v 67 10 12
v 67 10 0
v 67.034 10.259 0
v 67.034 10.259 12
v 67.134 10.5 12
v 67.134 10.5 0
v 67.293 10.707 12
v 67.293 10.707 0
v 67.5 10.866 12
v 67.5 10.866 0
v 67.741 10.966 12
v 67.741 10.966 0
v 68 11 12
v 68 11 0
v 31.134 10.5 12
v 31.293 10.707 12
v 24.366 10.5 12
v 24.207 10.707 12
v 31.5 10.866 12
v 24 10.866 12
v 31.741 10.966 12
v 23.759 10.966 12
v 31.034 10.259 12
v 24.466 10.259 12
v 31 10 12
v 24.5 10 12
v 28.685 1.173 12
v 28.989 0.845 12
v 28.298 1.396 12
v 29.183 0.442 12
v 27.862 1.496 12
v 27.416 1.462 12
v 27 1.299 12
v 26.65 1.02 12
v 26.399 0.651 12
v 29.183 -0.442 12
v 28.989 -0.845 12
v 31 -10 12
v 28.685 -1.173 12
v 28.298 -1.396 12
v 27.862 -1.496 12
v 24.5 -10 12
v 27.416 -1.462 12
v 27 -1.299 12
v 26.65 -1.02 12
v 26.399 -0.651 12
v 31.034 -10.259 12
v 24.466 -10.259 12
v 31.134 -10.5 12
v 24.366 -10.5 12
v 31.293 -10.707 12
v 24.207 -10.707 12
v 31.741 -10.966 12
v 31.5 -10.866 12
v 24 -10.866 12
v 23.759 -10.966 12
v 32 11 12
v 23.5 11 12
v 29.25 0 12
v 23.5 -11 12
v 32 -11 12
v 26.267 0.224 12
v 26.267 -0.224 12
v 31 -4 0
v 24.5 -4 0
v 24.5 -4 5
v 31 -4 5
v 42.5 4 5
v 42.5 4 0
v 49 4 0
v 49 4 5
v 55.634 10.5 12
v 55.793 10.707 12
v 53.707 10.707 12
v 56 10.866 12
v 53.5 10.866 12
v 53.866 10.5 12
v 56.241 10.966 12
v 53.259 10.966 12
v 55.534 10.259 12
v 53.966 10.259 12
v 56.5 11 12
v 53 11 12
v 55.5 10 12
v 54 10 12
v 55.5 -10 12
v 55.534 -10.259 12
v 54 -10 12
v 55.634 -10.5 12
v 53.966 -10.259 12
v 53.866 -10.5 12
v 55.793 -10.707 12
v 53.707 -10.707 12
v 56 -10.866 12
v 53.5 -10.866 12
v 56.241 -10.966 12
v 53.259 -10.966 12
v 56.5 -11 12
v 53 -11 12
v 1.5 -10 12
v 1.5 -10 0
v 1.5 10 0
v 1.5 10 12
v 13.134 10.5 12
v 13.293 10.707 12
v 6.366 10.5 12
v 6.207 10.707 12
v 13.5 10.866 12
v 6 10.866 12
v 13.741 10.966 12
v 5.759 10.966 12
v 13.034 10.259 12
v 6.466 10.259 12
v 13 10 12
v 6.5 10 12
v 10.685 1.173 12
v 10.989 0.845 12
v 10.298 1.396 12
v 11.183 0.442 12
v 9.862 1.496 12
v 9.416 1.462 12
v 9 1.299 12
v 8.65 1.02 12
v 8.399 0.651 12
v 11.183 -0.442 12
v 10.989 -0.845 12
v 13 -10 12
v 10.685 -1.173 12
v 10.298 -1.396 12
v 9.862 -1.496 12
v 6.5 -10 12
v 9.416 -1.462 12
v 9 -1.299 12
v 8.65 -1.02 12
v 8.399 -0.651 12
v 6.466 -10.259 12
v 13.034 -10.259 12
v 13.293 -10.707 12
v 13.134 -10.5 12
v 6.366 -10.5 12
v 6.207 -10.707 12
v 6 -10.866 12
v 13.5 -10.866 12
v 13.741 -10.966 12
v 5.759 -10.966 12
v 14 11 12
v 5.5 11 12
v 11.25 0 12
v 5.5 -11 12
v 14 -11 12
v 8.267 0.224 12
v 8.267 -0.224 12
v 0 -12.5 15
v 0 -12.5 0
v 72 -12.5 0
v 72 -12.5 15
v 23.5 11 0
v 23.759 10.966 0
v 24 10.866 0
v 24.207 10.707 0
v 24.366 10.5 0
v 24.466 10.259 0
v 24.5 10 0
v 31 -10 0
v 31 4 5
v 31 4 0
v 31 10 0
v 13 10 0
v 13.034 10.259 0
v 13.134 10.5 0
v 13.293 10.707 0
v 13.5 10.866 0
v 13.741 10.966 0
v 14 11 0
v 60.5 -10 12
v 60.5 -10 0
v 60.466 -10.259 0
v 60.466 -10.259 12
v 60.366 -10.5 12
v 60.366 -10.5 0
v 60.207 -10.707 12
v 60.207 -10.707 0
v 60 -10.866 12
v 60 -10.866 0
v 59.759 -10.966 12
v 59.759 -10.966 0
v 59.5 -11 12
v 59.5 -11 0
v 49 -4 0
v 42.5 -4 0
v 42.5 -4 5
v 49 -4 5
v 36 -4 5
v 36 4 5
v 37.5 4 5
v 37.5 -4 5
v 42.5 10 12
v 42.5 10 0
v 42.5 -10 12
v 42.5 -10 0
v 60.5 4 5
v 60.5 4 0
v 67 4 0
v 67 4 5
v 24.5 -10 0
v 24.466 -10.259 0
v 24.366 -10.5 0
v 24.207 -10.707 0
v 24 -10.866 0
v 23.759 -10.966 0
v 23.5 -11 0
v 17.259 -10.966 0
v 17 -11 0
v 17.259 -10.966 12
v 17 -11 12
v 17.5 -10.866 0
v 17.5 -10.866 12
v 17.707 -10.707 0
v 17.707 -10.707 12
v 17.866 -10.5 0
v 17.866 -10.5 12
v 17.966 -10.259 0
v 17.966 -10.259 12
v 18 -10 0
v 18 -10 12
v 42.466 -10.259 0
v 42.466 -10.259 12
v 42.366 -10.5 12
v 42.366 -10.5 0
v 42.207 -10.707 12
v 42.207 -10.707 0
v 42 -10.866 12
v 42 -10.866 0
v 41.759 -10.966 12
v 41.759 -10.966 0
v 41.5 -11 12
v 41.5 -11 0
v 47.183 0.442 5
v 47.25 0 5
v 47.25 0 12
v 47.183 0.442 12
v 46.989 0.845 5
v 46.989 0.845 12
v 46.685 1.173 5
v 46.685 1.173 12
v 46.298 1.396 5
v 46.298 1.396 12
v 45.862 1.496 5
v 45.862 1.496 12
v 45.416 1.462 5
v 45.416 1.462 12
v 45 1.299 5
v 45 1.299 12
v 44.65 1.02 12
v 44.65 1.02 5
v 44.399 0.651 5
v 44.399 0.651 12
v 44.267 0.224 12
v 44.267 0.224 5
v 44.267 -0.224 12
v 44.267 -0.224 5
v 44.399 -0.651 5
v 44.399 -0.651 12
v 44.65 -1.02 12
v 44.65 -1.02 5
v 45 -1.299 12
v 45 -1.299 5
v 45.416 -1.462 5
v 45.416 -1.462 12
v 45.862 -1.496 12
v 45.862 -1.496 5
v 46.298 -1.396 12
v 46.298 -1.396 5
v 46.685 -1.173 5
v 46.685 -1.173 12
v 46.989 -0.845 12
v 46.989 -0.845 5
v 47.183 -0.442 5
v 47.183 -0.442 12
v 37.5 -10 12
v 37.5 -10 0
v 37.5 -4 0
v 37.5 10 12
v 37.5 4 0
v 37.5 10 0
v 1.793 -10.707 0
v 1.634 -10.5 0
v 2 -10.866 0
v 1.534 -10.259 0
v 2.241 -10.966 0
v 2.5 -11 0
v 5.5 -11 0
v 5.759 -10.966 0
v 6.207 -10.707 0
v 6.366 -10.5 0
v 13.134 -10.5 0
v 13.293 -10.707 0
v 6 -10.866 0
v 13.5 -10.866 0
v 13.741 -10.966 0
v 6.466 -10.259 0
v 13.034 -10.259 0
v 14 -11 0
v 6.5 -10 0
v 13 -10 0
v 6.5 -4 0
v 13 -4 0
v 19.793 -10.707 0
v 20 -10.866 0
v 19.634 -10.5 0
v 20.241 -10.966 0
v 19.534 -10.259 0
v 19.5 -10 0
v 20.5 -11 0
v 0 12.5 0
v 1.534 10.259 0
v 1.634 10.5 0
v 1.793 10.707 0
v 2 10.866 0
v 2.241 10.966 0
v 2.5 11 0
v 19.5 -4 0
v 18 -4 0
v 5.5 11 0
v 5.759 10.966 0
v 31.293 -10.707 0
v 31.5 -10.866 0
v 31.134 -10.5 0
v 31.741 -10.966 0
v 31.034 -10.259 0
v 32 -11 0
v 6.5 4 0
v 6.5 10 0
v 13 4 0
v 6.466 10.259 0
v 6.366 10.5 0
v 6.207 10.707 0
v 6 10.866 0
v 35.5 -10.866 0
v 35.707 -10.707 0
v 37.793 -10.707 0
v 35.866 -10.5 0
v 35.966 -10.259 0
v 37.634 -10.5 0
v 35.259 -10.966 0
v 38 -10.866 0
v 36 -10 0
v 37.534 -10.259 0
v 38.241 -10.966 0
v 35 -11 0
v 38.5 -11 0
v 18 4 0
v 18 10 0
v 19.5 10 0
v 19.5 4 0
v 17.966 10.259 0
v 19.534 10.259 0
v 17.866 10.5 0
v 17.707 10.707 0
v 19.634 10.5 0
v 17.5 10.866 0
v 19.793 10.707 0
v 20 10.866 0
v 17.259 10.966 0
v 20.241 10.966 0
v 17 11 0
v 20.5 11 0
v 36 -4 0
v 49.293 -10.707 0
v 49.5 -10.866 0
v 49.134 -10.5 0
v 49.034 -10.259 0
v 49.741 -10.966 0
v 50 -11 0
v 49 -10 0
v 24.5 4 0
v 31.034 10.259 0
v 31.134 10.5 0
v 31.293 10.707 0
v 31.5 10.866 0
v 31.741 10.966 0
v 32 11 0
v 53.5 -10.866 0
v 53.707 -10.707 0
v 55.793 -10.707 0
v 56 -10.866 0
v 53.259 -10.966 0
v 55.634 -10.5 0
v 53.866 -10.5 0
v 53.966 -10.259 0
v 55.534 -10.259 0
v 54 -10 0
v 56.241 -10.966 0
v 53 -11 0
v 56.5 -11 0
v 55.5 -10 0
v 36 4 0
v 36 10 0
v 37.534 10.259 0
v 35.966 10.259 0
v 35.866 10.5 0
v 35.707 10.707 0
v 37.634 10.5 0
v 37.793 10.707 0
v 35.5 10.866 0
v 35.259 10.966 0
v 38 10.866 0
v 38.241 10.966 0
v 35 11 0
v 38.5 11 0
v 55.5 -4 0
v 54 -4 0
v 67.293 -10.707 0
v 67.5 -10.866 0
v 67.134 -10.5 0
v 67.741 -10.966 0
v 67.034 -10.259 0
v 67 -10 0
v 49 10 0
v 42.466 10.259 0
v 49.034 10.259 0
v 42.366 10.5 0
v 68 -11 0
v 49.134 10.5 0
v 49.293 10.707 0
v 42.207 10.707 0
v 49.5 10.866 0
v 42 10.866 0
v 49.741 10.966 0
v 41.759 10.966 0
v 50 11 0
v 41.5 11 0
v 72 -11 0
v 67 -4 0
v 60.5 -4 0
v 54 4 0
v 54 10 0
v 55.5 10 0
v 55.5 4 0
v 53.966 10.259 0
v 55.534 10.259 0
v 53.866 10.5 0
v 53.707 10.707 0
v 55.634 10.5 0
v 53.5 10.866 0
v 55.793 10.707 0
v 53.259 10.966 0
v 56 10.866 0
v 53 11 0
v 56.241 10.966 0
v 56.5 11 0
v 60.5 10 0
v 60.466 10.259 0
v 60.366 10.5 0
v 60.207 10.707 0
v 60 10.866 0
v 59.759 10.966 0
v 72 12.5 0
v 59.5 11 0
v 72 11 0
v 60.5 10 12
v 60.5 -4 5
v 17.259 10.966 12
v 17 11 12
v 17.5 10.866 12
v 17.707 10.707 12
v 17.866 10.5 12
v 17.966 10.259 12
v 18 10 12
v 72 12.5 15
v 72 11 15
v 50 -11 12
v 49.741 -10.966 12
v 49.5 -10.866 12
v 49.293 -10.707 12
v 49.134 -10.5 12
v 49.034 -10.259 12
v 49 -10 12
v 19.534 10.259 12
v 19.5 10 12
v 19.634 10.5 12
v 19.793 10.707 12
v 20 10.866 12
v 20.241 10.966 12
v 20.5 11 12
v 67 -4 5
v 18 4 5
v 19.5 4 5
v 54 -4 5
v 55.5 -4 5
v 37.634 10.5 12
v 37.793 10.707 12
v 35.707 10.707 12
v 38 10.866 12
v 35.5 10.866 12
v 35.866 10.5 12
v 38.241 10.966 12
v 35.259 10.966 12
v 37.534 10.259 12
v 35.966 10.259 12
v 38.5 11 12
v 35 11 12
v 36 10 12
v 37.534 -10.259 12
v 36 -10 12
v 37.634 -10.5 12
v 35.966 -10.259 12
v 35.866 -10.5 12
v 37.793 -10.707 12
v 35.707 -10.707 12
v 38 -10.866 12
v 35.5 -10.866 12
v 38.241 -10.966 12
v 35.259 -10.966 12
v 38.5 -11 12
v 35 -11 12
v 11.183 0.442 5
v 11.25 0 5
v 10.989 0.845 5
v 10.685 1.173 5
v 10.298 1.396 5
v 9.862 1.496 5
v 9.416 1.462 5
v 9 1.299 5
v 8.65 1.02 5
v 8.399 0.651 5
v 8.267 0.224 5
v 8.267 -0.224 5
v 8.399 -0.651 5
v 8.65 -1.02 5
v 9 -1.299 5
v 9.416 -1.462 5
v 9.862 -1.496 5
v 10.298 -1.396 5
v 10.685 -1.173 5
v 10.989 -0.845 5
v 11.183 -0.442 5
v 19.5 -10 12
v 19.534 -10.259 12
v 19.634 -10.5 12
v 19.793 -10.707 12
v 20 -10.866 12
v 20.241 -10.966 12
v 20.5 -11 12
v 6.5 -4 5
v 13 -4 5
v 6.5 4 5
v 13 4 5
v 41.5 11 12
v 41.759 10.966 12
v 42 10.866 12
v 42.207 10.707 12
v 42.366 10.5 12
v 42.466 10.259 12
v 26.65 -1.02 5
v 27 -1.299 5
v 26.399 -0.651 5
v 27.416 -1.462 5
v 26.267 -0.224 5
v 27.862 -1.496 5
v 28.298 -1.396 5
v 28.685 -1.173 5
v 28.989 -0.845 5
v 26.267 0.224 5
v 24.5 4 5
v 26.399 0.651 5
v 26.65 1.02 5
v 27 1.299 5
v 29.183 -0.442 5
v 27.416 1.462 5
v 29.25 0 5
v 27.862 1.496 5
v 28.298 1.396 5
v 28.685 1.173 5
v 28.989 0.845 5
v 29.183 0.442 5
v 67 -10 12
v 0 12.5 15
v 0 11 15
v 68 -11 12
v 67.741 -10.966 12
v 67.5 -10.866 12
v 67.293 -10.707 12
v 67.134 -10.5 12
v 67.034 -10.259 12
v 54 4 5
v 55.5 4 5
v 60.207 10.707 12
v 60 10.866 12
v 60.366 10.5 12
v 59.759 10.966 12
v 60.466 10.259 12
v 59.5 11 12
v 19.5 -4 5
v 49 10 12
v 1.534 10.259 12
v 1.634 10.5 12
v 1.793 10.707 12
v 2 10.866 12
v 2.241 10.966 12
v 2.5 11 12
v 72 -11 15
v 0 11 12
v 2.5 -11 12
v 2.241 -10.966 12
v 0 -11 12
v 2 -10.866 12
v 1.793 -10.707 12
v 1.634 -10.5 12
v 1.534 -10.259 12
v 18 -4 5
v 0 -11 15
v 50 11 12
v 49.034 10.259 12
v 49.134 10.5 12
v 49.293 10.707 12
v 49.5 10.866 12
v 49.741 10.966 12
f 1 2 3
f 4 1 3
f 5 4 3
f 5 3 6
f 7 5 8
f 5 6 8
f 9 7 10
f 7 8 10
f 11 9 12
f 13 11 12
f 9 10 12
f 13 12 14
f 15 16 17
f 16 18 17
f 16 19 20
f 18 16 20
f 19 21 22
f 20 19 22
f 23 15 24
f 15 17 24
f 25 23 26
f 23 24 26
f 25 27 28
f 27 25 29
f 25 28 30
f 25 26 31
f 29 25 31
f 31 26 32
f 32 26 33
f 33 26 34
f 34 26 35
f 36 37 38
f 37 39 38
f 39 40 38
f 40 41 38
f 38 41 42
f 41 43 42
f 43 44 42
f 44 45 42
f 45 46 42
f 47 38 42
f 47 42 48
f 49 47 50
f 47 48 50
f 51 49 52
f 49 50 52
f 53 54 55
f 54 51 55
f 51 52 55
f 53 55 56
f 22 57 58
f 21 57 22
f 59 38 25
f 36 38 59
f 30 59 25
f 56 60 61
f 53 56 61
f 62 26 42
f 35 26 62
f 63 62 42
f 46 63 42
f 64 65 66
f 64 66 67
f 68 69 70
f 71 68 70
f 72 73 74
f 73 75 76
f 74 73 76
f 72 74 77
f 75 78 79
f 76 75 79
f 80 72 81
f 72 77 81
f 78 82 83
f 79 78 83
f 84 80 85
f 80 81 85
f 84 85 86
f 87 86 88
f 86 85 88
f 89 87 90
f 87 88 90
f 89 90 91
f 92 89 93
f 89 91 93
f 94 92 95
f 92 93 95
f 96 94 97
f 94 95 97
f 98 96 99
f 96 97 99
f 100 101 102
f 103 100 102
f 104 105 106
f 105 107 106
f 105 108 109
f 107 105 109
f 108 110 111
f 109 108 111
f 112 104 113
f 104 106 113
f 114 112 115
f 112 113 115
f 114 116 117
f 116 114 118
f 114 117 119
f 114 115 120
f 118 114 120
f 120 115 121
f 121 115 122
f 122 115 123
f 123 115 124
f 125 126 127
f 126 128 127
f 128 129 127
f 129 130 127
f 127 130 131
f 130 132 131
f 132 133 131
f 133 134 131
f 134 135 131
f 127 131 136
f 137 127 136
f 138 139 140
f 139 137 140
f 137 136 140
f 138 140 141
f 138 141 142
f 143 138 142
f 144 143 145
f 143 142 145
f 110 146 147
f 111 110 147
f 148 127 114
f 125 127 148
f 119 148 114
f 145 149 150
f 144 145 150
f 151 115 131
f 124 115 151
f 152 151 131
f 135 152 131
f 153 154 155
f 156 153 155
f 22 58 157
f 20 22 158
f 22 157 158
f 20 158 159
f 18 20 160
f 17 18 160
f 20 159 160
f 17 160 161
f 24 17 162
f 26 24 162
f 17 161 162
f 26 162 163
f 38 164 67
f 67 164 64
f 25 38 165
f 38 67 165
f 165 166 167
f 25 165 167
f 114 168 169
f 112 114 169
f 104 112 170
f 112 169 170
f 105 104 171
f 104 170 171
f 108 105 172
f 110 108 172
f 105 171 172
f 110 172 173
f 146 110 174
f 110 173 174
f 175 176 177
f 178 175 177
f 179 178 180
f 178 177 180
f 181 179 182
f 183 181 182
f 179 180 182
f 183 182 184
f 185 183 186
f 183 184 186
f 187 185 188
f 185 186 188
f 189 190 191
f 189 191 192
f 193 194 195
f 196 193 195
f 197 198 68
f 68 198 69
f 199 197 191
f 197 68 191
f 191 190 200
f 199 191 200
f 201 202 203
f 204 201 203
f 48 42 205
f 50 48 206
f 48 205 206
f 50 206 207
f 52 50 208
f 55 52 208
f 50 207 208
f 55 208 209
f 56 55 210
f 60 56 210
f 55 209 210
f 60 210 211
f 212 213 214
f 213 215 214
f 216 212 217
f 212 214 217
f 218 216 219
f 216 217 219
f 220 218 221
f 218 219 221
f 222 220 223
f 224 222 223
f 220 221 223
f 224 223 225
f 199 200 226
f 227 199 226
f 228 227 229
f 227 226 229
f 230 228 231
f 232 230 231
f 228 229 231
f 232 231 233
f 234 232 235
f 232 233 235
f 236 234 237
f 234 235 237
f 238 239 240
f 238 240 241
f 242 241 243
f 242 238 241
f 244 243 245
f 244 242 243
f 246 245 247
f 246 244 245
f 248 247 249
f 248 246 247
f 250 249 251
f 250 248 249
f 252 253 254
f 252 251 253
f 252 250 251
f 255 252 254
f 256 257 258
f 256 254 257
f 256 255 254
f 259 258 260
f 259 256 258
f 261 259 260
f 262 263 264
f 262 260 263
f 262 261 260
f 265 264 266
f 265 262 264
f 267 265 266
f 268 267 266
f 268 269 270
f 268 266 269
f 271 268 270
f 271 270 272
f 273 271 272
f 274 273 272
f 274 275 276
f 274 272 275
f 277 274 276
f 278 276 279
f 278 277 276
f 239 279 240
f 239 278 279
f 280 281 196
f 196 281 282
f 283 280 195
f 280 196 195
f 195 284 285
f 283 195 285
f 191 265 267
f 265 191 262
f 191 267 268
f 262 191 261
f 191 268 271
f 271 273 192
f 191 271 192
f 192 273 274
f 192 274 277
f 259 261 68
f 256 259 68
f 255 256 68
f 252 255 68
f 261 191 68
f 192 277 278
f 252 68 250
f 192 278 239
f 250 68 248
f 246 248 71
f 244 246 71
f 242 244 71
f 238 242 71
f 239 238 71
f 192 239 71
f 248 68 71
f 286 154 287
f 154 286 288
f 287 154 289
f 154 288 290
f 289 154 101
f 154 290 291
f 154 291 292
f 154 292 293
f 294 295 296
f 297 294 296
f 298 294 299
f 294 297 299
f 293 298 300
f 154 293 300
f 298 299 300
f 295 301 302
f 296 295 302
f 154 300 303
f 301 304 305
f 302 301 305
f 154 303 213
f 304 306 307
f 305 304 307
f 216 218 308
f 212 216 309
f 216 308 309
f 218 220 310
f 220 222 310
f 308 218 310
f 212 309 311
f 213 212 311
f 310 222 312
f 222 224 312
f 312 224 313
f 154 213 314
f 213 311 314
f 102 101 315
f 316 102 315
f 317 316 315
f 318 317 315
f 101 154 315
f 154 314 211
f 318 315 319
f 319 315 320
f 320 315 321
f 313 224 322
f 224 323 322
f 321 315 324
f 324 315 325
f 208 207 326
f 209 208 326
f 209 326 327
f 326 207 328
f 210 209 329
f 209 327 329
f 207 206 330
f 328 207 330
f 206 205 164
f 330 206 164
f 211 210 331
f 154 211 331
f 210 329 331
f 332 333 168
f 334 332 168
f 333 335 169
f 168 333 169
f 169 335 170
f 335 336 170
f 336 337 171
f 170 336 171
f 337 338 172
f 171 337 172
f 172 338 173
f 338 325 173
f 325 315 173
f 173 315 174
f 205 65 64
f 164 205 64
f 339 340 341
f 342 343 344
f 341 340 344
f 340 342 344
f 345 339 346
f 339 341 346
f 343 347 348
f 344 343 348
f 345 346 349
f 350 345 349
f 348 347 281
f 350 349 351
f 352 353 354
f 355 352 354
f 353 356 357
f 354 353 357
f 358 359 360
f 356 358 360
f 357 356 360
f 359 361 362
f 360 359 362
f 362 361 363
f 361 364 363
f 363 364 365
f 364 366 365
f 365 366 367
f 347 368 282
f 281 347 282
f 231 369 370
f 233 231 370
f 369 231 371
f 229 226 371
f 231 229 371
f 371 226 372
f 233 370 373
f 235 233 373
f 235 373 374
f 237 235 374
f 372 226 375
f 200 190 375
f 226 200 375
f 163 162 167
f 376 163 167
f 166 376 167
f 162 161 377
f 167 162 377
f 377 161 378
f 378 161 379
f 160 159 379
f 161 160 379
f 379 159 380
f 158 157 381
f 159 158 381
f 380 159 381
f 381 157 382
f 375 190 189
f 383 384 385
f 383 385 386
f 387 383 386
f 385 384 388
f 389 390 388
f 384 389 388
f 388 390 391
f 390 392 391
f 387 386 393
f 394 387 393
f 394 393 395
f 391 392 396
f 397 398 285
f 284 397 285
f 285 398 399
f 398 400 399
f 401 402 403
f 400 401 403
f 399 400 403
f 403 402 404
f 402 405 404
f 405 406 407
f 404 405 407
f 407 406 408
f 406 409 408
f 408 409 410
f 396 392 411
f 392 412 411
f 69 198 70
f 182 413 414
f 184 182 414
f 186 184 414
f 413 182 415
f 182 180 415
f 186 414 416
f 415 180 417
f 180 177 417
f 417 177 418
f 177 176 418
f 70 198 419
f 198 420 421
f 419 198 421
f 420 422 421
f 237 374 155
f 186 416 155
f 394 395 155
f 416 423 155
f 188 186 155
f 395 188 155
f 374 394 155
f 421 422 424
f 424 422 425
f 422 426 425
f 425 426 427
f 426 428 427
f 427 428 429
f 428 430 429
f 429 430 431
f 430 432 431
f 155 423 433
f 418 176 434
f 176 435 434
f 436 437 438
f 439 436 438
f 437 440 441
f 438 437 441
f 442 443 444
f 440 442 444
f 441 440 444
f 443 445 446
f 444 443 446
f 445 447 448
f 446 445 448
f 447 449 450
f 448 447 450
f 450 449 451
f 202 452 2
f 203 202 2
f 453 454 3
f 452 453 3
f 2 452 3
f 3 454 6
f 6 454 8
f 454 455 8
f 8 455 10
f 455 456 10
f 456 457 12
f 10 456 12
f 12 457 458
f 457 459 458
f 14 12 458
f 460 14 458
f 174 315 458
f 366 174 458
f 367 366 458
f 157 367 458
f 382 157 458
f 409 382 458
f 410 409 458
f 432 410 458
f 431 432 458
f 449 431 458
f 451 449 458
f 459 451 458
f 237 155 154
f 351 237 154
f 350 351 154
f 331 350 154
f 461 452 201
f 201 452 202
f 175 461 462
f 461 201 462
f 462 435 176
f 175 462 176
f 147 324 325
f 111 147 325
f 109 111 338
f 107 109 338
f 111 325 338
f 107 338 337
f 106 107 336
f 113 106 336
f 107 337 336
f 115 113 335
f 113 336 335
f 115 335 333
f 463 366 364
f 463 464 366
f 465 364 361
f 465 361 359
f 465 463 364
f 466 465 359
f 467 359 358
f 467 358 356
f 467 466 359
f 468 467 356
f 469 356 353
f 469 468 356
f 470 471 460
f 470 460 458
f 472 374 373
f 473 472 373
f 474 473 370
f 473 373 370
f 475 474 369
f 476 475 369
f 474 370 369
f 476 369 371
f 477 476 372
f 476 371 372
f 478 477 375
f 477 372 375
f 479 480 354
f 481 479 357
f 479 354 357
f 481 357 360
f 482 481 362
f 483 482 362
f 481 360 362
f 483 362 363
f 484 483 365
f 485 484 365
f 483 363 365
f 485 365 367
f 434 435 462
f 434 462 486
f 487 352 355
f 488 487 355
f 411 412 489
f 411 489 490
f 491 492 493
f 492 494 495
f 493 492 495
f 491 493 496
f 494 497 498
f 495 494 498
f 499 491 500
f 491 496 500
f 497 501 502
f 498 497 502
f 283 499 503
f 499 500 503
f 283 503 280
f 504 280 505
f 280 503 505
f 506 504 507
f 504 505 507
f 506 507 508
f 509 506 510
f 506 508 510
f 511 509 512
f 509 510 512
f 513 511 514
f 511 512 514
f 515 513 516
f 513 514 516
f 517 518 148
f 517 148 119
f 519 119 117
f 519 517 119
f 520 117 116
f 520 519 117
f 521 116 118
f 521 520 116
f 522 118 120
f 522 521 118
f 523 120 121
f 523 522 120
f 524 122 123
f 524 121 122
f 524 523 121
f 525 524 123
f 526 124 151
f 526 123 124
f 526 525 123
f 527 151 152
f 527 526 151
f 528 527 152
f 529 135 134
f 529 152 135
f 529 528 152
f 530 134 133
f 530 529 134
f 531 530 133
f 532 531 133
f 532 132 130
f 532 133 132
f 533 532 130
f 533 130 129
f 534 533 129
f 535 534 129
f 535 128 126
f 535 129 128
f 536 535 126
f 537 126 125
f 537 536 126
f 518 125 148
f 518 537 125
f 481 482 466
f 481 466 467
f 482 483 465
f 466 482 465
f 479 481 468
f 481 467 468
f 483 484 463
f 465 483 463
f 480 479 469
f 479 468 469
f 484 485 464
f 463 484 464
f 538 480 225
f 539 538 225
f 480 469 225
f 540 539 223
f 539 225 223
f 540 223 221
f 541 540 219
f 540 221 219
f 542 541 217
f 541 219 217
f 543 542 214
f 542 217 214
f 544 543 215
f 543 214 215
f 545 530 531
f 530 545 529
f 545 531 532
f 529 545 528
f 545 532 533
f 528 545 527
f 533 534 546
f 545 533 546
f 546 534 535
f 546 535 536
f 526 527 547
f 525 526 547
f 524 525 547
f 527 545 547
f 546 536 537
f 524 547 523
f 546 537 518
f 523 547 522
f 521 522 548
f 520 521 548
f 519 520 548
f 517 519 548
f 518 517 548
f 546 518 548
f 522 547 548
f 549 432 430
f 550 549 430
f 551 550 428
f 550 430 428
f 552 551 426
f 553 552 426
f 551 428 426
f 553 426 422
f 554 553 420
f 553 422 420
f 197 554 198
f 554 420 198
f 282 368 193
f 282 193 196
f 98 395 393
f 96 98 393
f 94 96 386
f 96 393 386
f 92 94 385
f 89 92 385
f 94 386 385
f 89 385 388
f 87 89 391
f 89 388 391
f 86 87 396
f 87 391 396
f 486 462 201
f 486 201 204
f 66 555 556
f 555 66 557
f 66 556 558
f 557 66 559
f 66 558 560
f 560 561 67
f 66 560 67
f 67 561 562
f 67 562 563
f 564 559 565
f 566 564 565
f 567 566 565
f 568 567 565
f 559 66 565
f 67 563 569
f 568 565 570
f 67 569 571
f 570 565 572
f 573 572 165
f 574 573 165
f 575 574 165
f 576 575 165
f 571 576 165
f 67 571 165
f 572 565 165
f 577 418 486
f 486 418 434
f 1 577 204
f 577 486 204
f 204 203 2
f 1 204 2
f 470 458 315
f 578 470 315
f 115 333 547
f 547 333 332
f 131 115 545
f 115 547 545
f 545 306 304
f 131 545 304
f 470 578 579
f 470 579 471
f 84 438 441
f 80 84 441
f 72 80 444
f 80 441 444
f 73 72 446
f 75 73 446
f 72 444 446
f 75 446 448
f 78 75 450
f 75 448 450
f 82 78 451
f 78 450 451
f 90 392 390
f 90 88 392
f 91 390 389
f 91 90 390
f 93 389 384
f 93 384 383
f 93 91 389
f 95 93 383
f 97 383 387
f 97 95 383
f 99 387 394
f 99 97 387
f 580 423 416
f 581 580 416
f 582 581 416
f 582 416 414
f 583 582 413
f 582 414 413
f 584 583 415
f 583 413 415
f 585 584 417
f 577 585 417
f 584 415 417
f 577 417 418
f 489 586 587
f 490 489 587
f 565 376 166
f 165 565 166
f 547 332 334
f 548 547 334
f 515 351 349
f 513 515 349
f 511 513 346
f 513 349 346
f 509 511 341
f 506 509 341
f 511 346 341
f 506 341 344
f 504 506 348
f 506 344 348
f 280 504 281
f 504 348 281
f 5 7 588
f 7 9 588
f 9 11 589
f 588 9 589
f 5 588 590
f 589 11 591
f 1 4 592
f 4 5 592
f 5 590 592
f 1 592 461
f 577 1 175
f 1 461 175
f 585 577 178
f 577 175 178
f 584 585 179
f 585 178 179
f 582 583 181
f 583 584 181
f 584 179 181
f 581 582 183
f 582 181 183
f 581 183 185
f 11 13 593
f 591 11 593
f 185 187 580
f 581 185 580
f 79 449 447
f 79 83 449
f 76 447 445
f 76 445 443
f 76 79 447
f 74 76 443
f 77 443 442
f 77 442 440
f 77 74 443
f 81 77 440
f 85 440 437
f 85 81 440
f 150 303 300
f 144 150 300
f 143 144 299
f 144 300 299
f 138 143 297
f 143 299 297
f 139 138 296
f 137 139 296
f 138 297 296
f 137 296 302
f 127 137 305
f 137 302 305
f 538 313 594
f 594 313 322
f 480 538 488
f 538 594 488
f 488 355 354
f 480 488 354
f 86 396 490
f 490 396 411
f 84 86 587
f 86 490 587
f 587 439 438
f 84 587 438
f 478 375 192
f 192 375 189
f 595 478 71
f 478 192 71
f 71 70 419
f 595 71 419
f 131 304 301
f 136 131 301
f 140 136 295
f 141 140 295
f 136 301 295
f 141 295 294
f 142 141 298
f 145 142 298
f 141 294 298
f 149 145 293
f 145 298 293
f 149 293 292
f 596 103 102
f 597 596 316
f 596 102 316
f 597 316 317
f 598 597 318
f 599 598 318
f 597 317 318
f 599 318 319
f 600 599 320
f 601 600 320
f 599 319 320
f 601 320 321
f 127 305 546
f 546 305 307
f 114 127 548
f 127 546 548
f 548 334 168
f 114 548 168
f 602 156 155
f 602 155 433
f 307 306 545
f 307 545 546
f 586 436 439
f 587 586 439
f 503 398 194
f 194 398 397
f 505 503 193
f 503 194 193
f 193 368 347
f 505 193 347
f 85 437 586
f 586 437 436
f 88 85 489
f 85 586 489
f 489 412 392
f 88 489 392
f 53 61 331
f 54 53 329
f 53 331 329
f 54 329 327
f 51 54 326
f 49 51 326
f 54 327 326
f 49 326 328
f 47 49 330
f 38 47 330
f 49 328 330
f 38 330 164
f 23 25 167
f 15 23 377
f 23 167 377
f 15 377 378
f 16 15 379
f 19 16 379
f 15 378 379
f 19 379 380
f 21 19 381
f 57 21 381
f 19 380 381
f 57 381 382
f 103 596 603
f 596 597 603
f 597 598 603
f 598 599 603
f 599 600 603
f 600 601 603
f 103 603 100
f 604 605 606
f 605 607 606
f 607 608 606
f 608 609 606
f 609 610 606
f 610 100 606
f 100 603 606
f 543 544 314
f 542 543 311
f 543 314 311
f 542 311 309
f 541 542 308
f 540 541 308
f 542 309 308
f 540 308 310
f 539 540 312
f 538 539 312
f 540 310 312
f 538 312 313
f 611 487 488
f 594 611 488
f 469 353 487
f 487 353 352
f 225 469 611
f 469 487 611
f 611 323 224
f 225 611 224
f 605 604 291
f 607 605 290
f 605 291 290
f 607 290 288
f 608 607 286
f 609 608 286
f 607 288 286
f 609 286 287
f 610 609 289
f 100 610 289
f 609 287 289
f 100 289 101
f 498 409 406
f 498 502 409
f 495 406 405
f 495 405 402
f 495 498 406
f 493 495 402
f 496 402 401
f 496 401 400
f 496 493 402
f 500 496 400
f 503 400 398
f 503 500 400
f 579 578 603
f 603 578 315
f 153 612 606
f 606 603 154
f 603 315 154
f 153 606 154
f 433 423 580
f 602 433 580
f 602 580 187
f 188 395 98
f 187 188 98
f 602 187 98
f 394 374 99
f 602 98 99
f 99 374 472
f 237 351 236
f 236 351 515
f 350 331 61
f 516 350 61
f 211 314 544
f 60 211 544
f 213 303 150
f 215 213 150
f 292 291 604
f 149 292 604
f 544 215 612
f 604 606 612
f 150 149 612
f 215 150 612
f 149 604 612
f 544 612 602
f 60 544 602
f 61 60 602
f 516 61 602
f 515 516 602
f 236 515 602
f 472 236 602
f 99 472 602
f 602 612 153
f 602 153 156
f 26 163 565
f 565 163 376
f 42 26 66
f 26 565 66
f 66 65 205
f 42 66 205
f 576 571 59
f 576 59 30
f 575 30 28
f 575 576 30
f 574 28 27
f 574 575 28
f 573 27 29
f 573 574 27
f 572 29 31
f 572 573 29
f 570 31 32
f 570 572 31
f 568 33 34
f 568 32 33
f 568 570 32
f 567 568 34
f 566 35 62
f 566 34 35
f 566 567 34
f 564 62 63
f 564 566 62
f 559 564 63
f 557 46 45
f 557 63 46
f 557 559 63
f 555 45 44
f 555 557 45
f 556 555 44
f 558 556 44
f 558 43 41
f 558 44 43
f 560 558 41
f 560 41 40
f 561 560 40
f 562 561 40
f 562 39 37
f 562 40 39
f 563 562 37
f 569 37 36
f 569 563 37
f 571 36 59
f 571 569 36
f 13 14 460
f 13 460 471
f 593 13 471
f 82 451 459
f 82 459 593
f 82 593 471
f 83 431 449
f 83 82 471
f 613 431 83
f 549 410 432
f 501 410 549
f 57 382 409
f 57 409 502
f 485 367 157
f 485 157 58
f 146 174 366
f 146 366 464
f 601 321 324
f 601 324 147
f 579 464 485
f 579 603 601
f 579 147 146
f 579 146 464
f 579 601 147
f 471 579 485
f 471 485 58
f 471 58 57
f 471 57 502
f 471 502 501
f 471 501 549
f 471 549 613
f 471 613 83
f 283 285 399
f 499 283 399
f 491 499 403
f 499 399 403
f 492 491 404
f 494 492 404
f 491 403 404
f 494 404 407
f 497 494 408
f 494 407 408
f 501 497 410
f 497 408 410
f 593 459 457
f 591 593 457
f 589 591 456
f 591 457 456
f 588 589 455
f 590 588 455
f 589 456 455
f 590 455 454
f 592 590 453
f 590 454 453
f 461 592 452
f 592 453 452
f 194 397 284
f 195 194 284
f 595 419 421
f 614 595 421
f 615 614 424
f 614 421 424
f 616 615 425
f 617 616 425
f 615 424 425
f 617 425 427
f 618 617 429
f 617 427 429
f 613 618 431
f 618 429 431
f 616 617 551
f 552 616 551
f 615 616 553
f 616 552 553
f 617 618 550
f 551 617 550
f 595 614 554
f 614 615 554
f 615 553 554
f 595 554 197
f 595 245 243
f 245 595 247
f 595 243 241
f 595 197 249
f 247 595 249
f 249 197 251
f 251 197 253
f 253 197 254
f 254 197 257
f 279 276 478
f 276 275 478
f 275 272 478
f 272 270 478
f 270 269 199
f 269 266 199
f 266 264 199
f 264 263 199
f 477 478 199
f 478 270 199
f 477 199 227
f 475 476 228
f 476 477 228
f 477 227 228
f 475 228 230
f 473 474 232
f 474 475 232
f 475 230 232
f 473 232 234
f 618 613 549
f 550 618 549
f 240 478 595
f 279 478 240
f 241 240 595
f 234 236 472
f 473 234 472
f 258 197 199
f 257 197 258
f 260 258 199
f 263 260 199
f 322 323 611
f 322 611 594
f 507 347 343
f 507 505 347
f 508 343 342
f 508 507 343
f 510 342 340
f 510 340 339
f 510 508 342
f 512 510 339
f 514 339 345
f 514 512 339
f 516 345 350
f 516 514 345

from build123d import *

# Parameters (mm, degrees)
F0_R     = 1.5
F1_DEPTH = 15
F2_W     = 60.5
F2_H     = 8
F3_DEPTH = 5
F4_W     = 22
F4_H     = 3
F5_DEPTH = 120
F6_R     = 1
F7_R     = 1
F8_R     = 1


with BuildPart() as f1:
    # F0 (on Top) → F1 (new body)
    with BuildSketch(Plane.XY):
        with BuildLine():
            Line((18, 12.5), (0, 12.5))
            Line((0, 12.5), (0, -12.5))
            Line((0, -12.5), (18, -12.5))
            Line((18, -12.5), (18, -11))
            Line((18, -11), (14, -11))
            ThreePointArc((14, -11), (13.292893, -10.707107), (13, -10))
            Line((13, -10), (13, 10))
            ThreePointArc((13, 10), (13.292893, 10.707107), (14, 11))
            Line((14, 11), (18, 11))
            Line((18, 11), (18, 12.5))
        make_face()
        with BuildLine():
            ThreePointArc((1.5, 10), (1.792893, 10.707107), (2.5, 11))
            Line((2.5, 11), (5.5, 11))
            ThreePointArc((5.5, 11), (6.207107, 10.707107), (6.5, 10))
            Line((6.5, 10), (6.5, -10))
            ThreePointArc((6.5, -10), (6.207107, -10.707107), (5.5, -11))
            Line((5.5, -11), (2.5, -11))
            ThreePointArc((2.5, -11), (1.792893, -10.707107), (1.5, -10))
            Line((1.5, -10), (1.5, 10))
        make_face(mode=Mode.SUBTRACT)
        with Locations((9.75, 0)):
            Circle(F0_R, mode=Mode.SUBTRACT)
        with BuildLine():
            Line((36, 12.5), (18, 12.5))
            Line((18, 12.5), (18, 11))
            Line((18, 11), (18, -11))
            Line((18, -11), (18, -12.5))
            Line((18, -12.5), (36, -12.5))
            Line((36, -12.5), (36, -11))
            Line((36, -11), (32, -11))
            ThreePointArc((32, -11), (31.292893, -10.707107), (31, -10))
            Line((31, -10), (31, 10))
            ThreePointArc((31, 10), (31.292893, 10.707107), (32, 11))
            Line((32, 11), (36, 11))
            Line((36, 11), (36, 12.5))
        make_face()
        with BuildLine():
            ThreePointArc((23.5, 11), (24.207107, 10.707107), (24.5, 10))
            Line((24.5, 10), (24.5, -10))
            ThreePointArc((24.5, -10), (24.207107, -10.707107), (23.5, -11))
            Line((23.5, -11), (20.5, -11))
            ThreePointArc((20.5, -11), (19.792893, -10.707107), (19.5, -10))
            Line((19.5, -10), (19.5, 10))
            ThreePointArc((19.5, 10), (19.792893, 10.707107), (20.5, 11))
            Line((20.5, 11), (23.5, 11))
        make_face(mode=Mode.SUBTRACT)
        with Locations((27.75, 0)):
            Circle(F0_R, mode=Mode.SUBTRACT)
        with BuildLine():
            Line((54, 12.5), (36, 12.5))
            Line((36, 12.5), (36, 11))
            Line((36, 11), (36, -11))
            Line((36, -11), (36, -12.5))
            Line((36, -12.5), (54, -12.5))
            Line((54, -12.5), (54, -11))
            Line((54, -11), (50, -11))
            ThreePointArc((50, -11), (49.292893, -10.707107), (49, -10))
            Line((49, -10), (49, 10))
            ThreePointArc((49, 10), (49.292893, 10.707107), (50, 11))
            Line((50, 11), (54, 11))
            Line((54, 11), (54, 12.5))
        make_face()
        with BuildLine():
            ThreePointArc((41.5, 11), (42.207107, 10.707107), (42.5, 10))
            Line((42.5, 10), (42.5, -10))
            ThreePointArc((42.5, -10), (42.207107, -10.707107), (41.5, -11))
            Line((41.5, -11), (38.5, -11))
            ThreePointArc((38.5, -11), (37.792893, -10.707107), (37.5, -10))
            Line((37.5, -10), (37.5, 10))
            ThreePointArc((37.5, 10), (37.792893, 10.707107), (38.5, 11))
            Line((38.5, 11), (41.5, 11))
        make_face(mode=Mode.SUBTRACT)
        with Locations((45.75, 0)):
            Circle(F0_R, mode=Mode.SUBTRACT)
        with BuildLine():
            Line((72, 12.5), (54, 12.5))
            Line((54, 12.5), (54, 11))
            Line((54, 11), (54, -11))
            Line((54, -11), (54, -12.5))
            Line((54, -12.5), (72, -12.5))
            Line((72, -12.5), (72, -11))
            Line((72, -11), (68, -11))
            ThreePointArc((68, -11), (67.292893, -10.707107), (67, -10))
            Line((67, -10), (67, 10))
            ThreePointArc((67, 10), (67.292893, 10.707107), (68, 11))
            Line((68, 11), (72, 11))
            Line((72, 11), (72, 12.5))
        make_face()
        with BuildLine():
            ThreePointArc((59.5, 11), (60.207107, 10.707107), (60.5, 10))
            Line((60.5, 10), (60.5, -10))
            ThreePointArc((60.5, -10), (60.207107, -10.707107), (59.5, -11))
            Line((59.5, -11), (56.5, -11))
            ThreePointArc((56.5, -11), (55.792893, -10.707107), (55.5, -10))
            Line((55.5, -10), (55.5, 10))
            ThreePointArc((55.5, 10), (55.792893, 10.707107), (56.5, 11))
            Line((56.5, 11), (59.5, 11))
        make_face(mode=Mode.SUBTRACT)
    extrude(amount=F1_DEPTH)

    # F2 (on Top) → F3 (cut)
    with BuildSketch(Plane.XY):
        with Locations((36.75, 0)):
            Rectangle(F2_W, F2_H)
    extrude(amount=F3_DEPTH, mode=Mode.SUBTRACT)

    # F4 (on face) → F5 (cut)
    with BuildSketch(Plane(origin=(0, 0, 0), x_dir=(0, -1, 0), z_dir=(-1, 0, 0))):
        with Locations((0, 13.5)):
            Rectangle(F4_W, F4_H)
    extrude(amount=-F5_DEPTH, mode=Mode.SUBTRACT)

    # F6
    f6_edges = [f1.edges().sort_by_distance(p)[0] for p in [
        (54, 11, 6),
        (36, 11, 6),
        (54, -11, 6),
        (36, -11, 6),
    ]]
    fillet(f6_edges, radius=F6_R)

    # F7
    f7_edges = [f1.edges().sort_by_distance(p)[0] for p in [
        (18, 11, 6),
    ]]
    fillet(f7_edges, radius=F7_R)

    # F8
    f8_edges = [f1.edges().sort_by_distance(p)[0] for p in [
        (18, -11, 6),
    ]]
    fillet(f8_edges, radius=F8_R)


solid = f1.part
